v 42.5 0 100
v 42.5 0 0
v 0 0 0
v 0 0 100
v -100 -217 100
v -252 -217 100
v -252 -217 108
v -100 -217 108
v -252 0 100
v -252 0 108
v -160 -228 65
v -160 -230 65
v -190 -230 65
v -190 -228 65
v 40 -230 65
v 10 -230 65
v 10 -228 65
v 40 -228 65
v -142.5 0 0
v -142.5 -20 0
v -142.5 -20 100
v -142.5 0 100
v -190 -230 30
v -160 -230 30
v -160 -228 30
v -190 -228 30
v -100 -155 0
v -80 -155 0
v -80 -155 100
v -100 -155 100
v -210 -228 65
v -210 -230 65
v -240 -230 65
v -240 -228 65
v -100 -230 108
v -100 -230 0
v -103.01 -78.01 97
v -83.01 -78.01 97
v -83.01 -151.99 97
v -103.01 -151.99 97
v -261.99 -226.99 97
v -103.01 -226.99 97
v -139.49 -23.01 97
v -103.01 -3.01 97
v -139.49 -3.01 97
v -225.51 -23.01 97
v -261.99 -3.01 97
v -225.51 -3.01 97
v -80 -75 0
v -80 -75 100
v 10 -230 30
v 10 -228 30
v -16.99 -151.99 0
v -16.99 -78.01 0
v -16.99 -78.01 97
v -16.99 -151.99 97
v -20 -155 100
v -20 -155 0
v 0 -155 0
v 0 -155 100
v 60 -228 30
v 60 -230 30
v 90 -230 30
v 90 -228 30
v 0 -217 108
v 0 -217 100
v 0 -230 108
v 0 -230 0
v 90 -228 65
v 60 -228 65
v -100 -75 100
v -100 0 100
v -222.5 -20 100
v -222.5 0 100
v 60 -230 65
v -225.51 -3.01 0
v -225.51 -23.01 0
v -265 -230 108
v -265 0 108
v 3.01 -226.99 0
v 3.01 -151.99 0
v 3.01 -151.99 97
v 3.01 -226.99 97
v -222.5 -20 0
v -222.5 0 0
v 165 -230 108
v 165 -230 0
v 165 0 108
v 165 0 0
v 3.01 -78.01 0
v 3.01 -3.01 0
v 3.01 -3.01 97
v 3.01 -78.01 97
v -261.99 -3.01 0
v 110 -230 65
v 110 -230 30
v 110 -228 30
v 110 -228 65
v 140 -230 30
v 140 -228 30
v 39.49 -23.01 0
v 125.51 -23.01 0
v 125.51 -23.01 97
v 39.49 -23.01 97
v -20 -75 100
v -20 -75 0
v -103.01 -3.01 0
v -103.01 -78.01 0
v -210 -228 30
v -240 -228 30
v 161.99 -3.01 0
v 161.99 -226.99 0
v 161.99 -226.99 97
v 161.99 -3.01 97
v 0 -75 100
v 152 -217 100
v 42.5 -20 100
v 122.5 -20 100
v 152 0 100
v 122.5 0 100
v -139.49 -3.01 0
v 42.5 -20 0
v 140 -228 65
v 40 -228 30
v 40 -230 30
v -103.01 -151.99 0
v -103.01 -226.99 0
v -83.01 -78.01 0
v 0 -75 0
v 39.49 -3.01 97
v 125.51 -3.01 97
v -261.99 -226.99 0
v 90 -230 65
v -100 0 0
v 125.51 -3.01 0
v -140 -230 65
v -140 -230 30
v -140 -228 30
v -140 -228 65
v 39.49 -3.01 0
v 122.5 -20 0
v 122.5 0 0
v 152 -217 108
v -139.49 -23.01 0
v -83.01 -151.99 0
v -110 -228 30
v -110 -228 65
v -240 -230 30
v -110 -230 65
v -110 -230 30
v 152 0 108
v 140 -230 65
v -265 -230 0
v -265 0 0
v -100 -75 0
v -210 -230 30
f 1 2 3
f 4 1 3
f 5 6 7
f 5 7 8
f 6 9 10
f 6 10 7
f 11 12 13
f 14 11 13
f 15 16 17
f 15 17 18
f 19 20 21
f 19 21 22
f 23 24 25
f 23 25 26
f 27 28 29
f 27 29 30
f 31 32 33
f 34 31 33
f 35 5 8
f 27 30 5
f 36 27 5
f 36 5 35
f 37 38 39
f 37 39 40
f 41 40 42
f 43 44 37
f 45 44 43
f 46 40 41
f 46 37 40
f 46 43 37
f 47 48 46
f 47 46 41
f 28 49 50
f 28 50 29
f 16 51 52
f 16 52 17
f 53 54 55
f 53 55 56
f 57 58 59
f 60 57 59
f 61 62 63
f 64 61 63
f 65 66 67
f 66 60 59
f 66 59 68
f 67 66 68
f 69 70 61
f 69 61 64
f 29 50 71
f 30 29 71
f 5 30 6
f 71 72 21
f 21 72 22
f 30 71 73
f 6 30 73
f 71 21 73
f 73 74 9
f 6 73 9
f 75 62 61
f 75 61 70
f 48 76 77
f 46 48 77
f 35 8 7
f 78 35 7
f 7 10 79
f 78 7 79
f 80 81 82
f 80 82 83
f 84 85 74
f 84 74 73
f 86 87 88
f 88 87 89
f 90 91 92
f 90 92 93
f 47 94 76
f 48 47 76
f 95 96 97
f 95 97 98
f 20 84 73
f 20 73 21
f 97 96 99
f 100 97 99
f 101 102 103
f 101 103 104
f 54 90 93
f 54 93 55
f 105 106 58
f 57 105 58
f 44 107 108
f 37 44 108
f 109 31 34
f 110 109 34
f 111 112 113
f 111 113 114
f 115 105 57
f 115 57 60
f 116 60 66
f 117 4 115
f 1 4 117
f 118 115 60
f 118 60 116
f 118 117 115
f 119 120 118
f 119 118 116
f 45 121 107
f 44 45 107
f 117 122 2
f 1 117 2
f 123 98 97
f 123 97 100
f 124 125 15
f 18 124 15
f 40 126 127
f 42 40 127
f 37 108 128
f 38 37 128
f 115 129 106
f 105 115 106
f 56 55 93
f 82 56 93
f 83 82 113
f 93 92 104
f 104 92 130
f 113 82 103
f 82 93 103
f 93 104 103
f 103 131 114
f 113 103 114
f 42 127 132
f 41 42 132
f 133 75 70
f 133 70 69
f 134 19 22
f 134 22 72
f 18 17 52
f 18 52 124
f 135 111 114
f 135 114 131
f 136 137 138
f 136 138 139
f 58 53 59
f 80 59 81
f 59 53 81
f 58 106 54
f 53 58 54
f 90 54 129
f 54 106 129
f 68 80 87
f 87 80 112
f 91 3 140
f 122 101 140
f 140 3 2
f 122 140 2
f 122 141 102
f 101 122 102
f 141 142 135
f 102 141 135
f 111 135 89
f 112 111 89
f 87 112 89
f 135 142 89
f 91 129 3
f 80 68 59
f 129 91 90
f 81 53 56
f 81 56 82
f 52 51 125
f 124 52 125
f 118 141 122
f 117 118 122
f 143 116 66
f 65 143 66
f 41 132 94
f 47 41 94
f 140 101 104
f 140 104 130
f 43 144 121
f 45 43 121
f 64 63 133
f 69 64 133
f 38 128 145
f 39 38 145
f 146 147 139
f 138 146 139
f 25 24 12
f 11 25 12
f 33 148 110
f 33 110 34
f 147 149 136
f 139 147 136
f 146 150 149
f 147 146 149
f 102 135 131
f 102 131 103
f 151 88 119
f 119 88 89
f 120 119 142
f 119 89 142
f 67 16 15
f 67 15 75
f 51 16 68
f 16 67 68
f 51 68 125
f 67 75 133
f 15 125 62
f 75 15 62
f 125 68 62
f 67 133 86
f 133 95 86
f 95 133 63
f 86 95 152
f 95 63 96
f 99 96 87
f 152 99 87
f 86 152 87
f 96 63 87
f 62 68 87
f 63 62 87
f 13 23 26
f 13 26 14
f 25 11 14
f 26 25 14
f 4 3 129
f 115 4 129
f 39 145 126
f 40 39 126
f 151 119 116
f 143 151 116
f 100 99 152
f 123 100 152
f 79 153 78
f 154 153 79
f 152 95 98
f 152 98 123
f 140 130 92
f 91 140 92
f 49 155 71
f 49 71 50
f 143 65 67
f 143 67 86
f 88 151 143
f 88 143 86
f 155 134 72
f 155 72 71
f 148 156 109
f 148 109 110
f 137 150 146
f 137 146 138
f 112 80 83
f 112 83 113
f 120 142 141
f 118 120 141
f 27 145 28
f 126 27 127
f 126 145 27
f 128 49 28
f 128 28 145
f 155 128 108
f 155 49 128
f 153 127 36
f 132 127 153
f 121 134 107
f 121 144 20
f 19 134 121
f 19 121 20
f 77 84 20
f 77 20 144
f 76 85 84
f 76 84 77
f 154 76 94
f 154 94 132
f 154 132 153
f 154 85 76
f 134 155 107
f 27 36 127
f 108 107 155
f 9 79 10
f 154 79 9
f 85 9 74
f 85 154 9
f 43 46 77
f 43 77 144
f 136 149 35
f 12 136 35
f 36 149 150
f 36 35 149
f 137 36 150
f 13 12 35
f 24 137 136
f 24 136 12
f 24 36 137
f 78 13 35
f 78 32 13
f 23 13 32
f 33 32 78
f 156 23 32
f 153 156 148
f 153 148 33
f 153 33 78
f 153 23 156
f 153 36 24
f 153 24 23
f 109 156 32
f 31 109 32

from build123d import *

# Parameters (mm, degrees)
F1_DEPTH  = 100
F3_DEPTH  = 3
F5_DEPTH  = 8
F6_W      = 30
F6_H      = 35
F7_DEPTH  = 1
F10_DEPTH = 100
F11_W     = 30
F11_H     = 35
F12_DEPTH = 2


with BuildPart() as f1:
    # F0 (on Top) → F1 (new body)
    with BuildSketch(Plane.XY):
        Polygon((42.5, 0), (0, 0), (0, -75), (-20, -75), (-20, -155), (0, -155), (0, -230), (165, -230), (165, 0), (122.5, 0), (122.5, -20), (42.5, -20), align=None)
        Polygon((2.499993, -227.500007), (2.499993, -152.500007), (-17.500007, -152.500007), (-17.500007, -77.499993), (2.499993, -77.499993), (2.499993, -2.499993), (40.000007, -2.499993), (40.000007, -22.499993), (124.999993, -22.499993), (124.999993, -2.499993), (162.500007, -2.499993), (162.500007, -227.500007), align=None, mode=Mode.SUBTRACT)
    extrude(amount=F1_DEPTH)

    # F2 (on face) → F3 (join)
    with BuildSketch(Plane.XY.offset(100)):
        Polygon((0, -155), (0, -230), (165, -230), (165, 0), (122.5, 0), (122.5, -20), (42.5, -20), (42.5, 0), (0, 0), (0, -75), (-20, -75), (-20, -155), align=None)
    extrude(amount=-F3_DEPTH)

    # F4 (on face) → F5 (join)
    with BuildSketch(Plane.XY.offset(100)):
        Polygon((0, -217), (0, -230), (165, -230), (165, -217), (165, 0), (152, 0), (152, -217), align=None)
    extrude(amount=F5_DEPTH)

    # F6 (on face) → F7 (cut)
    with BuildSketch(Plane.YZ.offset(165)):
        with Locations((-25, 47.5)):
            Rectangle(F6_W, F6_H)
        with Locations((-75, 47.5)):
            Rectangle(F6_W, F6_H)
        with Locations((-125, 47.5)):
            Rectangle(F6_W, F6_H)
        with Locations((-175, 47.5)):
            Rectangle(F6_W, F6_H)
    extrude(amount=-F7_DEPTH, mode=Mode.SUBTRACT)

    # F8 (on face) → F10 (join)
    with BuildSketch(Plane(origin=(0, 0, 0), x_dir=(1, 0, 0), z_dir=(0, 0, -1))):
        Polygon((165, 230), (0, 230), (0, 155), (-20, 155), (-20, 75), (0, 75), (0, 0), (42.5, 0), (42.5, 20), (122.5, 20), (122.5, 0), (165, 0), align=None)
        Polygon((3.01, 226.99), (161.99, 226.99), (161.99, 3.01), (125.51, 3.01), (125.51, 23.01), (39.49, 23.01), (39.49, 3.01), (3.01, 3.01), (3.01, 78.01), (-16.99, 78.01), (-16.99, 151.99), (3.01, 151.99), align=None, mode=Mode.SUBTRACT)
    extrude(amount=-F10_DEPTH)

    # F11 (on face) → F12 (cut)
    with BuildSketch(Plane.XZ.offset(230)):
        with Locations((25, 47.5)):
            Rectangle(F11_W, F11_H)
        with Locations((75, 47.5)):
            Rectangle(F11_W, F11_H)
        with Locations((125, 47.5)):
            Rectangle(F11_W, F11_H)
    extrude(amount=-F12_DEPTH, mode=Mode.SUBTRACT)


with BuildPart() as f13_1:
    # F13: instance of F1
    add(f1.part.mirror(Plane.YZ.offset(-50)))


solid = Compound([f1.part, f13_1.part])
